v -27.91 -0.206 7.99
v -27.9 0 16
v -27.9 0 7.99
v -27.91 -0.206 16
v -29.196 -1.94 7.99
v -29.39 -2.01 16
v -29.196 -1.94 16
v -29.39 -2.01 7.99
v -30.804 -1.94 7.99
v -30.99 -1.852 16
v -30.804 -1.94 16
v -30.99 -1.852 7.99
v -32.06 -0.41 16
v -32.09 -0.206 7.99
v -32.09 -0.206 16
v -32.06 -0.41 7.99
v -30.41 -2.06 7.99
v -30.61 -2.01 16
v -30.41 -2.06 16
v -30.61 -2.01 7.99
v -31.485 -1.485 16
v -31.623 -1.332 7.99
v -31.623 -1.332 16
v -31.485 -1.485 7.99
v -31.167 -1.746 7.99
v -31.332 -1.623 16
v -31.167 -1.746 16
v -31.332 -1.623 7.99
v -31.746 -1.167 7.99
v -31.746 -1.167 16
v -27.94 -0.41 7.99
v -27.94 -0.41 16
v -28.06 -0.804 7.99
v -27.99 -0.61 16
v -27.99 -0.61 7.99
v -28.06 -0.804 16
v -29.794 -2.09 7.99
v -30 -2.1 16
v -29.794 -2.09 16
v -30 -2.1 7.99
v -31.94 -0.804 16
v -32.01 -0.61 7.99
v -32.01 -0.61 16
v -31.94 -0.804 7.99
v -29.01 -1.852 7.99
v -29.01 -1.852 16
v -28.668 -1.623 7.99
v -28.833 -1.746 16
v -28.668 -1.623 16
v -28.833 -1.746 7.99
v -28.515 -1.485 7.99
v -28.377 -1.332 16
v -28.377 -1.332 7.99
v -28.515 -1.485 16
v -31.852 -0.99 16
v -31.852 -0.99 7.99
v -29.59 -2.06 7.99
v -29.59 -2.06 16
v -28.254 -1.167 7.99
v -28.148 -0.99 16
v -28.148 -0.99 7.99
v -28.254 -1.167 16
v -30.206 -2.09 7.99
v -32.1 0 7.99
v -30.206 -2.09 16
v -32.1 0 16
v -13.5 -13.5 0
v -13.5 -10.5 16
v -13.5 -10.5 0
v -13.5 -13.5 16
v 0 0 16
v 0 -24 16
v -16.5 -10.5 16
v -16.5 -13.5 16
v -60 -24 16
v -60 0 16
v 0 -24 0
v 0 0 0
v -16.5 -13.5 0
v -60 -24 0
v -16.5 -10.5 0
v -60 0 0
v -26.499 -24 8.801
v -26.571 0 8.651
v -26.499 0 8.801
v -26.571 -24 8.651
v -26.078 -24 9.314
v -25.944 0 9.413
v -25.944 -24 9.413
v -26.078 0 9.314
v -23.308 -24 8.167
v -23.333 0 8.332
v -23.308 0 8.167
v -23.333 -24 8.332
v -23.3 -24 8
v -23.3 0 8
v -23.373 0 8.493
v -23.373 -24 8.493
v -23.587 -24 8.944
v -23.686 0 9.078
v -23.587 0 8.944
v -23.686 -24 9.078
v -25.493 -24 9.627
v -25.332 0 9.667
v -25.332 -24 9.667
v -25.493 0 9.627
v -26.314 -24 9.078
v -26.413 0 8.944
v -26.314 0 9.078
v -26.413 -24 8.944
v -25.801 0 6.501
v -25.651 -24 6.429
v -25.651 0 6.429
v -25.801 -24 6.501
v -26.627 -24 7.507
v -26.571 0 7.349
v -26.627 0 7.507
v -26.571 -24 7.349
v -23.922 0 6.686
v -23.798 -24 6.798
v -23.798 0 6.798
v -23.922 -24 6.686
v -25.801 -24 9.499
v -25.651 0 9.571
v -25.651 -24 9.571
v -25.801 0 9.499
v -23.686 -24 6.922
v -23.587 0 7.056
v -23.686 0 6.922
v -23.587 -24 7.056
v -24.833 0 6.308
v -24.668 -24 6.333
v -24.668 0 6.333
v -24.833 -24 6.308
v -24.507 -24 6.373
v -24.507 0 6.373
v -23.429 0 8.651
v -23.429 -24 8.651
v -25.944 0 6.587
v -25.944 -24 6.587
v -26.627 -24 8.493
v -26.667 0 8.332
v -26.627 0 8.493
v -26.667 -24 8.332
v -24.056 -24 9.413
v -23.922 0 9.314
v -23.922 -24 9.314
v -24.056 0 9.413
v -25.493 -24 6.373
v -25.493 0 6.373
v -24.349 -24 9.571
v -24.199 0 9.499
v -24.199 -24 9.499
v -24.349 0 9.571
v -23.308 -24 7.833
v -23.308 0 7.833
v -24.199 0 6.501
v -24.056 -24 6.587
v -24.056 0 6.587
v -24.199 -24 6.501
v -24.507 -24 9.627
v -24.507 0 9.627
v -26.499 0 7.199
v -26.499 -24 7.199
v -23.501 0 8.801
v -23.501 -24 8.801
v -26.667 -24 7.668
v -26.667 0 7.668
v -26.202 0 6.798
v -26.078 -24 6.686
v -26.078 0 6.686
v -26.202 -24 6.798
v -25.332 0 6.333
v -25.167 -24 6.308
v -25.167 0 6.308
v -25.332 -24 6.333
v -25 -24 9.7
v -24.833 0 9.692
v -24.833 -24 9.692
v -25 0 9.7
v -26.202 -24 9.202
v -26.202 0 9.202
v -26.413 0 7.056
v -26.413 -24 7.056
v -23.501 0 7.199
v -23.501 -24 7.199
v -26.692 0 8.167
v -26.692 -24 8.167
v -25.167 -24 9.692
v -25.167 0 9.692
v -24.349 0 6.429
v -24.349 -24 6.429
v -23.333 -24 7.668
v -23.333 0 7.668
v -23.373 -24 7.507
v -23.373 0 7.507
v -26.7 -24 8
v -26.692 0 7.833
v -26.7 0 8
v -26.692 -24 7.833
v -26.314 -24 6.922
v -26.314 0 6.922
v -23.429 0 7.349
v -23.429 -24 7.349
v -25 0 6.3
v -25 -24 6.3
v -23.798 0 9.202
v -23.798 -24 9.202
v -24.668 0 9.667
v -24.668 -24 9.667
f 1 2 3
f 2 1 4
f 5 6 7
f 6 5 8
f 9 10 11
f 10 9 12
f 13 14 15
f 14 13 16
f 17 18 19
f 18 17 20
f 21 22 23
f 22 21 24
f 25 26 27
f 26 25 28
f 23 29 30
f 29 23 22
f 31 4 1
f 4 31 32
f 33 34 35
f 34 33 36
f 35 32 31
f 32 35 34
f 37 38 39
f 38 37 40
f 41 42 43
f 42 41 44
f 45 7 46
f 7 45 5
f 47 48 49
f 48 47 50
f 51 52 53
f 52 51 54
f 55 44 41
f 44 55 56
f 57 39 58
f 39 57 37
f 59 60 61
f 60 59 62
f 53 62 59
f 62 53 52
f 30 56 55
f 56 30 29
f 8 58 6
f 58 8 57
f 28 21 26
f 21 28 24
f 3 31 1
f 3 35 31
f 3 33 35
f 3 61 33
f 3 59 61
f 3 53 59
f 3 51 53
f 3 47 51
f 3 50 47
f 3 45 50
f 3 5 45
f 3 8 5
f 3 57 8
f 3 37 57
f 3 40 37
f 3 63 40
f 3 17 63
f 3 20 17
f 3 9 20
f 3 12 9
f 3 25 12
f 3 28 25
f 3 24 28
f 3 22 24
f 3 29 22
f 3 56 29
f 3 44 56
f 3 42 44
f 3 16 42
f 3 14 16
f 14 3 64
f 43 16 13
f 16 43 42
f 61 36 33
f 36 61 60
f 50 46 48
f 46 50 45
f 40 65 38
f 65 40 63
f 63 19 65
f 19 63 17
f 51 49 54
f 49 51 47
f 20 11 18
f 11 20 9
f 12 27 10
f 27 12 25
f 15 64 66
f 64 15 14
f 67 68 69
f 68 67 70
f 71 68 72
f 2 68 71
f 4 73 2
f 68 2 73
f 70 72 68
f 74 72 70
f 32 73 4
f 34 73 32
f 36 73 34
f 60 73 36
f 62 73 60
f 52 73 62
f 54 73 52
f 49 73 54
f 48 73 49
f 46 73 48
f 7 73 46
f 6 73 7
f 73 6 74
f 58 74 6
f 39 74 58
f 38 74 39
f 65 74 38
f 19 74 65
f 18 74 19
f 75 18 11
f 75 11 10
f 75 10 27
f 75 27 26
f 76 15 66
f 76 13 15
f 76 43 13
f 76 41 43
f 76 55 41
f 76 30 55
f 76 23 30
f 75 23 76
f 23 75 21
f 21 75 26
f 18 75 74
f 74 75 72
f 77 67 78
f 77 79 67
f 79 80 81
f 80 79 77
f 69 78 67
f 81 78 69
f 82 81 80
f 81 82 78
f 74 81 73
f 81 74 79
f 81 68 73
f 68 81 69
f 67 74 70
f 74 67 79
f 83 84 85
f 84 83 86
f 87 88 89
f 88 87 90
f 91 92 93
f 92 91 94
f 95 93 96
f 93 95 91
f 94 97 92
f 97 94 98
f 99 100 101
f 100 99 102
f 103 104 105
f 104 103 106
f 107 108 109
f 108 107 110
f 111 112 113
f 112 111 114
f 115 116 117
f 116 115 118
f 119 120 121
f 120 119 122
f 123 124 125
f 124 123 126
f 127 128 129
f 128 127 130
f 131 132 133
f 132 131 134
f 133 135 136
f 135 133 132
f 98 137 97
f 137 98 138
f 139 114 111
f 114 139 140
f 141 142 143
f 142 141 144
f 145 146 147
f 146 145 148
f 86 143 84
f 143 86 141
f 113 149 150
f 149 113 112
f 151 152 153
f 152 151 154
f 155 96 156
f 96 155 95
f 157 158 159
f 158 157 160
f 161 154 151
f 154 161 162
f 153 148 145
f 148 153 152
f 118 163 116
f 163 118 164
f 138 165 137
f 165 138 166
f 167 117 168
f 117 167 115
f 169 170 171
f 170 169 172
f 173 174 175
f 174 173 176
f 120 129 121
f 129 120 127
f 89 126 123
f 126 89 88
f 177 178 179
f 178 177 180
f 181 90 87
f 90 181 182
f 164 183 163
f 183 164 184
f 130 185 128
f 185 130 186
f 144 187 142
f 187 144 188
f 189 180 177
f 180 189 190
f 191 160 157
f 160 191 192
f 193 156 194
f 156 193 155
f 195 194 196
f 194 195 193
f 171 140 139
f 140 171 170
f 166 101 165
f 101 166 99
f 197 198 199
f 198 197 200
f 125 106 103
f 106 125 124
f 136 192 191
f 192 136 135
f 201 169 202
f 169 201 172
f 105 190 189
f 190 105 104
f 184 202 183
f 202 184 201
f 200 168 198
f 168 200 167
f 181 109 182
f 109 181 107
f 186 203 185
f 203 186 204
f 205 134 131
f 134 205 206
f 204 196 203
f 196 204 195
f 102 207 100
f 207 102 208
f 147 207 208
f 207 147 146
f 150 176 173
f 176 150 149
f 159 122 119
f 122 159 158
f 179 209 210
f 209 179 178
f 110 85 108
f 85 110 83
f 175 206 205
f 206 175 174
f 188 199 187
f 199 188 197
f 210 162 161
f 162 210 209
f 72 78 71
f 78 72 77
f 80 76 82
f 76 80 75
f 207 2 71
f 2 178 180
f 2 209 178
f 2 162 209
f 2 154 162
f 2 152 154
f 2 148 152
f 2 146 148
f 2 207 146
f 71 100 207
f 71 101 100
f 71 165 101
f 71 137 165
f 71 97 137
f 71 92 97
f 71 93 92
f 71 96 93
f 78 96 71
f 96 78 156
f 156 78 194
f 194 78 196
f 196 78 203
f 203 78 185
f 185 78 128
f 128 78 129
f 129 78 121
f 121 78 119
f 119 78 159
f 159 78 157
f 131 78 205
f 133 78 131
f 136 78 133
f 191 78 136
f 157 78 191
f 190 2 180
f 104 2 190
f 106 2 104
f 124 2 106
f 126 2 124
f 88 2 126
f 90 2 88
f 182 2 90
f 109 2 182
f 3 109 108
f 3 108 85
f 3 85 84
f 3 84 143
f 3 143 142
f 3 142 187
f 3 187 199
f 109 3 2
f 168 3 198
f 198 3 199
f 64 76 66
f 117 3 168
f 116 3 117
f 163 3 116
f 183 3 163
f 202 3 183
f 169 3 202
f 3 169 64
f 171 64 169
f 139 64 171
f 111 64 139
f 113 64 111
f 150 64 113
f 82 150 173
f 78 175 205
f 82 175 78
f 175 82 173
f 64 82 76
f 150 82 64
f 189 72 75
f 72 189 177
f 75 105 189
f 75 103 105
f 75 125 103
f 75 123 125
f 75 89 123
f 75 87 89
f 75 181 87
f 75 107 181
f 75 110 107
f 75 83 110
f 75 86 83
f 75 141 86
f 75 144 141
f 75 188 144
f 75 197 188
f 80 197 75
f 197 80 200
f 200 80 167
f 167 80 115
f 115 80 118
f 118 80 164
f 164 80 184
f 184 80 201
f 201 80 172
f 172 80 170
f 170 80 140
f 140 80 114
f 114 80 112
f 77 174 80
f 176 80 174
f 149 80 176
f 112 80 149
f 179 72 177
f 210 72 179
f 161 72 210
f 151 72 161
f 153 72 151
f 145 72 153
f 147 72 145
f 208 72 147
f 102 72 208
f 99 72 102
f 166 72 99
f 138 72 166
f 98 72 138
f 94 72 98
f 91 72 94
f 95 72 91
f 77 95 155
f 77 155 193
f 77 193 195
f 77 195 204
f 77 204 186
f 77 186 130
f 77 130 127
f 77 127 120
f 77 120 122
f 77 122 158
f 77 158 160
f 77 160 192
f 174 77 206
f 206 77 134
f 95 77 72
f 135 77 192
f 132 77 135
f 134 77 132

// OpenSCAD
// Built by bench/smallmodels/features/compiler.py from a list of features.
$fn = 64;
difference() {
  union() {
    translate([-30, -12, 0]) translate([-30, -12, 0]) cube([60, 24, 16]);
  }
  union() {
    translate([-30, 0, 7.99]) rotate([0, 0, 0]) cylinder(d = 4.2, h = 8.02);
    translate([-15, -12, 0]) rotate([0, 0, 0]) translate([-1.5, -1.5, 0]) cube([3, 3, 16]);
    translate([15, -12, 0]) rotate([0, 0, 0]) translate([-1.5, -1.5, 0]) cube([3, 3, 16]);
    translate([-15, 12, 9.99]) rotate([0, 0, 0]) cylinder(d = 4.2, h = 6.02);
    translate([0, 12, 9.99]) rotate([0, 0, 0]) cylinder(d = 4.2, h = 6.02);
    translate([15, 12, 9.99]) rotate([0, 0, 0]) cylinder(d = 4.2, h = 6.02);
    translate([-25, -6, 8]) rotate([0, 0, 0]) rotate([90, 0, 0]) cylinder(d = 3.4, h = 1064, center = true);
    translate([25, -6, 8]) rotate([0, 0, 0]) rotate([90, 0, 0]) cylinder(d = 3.4, h = 1064, center = true);
  }
}
